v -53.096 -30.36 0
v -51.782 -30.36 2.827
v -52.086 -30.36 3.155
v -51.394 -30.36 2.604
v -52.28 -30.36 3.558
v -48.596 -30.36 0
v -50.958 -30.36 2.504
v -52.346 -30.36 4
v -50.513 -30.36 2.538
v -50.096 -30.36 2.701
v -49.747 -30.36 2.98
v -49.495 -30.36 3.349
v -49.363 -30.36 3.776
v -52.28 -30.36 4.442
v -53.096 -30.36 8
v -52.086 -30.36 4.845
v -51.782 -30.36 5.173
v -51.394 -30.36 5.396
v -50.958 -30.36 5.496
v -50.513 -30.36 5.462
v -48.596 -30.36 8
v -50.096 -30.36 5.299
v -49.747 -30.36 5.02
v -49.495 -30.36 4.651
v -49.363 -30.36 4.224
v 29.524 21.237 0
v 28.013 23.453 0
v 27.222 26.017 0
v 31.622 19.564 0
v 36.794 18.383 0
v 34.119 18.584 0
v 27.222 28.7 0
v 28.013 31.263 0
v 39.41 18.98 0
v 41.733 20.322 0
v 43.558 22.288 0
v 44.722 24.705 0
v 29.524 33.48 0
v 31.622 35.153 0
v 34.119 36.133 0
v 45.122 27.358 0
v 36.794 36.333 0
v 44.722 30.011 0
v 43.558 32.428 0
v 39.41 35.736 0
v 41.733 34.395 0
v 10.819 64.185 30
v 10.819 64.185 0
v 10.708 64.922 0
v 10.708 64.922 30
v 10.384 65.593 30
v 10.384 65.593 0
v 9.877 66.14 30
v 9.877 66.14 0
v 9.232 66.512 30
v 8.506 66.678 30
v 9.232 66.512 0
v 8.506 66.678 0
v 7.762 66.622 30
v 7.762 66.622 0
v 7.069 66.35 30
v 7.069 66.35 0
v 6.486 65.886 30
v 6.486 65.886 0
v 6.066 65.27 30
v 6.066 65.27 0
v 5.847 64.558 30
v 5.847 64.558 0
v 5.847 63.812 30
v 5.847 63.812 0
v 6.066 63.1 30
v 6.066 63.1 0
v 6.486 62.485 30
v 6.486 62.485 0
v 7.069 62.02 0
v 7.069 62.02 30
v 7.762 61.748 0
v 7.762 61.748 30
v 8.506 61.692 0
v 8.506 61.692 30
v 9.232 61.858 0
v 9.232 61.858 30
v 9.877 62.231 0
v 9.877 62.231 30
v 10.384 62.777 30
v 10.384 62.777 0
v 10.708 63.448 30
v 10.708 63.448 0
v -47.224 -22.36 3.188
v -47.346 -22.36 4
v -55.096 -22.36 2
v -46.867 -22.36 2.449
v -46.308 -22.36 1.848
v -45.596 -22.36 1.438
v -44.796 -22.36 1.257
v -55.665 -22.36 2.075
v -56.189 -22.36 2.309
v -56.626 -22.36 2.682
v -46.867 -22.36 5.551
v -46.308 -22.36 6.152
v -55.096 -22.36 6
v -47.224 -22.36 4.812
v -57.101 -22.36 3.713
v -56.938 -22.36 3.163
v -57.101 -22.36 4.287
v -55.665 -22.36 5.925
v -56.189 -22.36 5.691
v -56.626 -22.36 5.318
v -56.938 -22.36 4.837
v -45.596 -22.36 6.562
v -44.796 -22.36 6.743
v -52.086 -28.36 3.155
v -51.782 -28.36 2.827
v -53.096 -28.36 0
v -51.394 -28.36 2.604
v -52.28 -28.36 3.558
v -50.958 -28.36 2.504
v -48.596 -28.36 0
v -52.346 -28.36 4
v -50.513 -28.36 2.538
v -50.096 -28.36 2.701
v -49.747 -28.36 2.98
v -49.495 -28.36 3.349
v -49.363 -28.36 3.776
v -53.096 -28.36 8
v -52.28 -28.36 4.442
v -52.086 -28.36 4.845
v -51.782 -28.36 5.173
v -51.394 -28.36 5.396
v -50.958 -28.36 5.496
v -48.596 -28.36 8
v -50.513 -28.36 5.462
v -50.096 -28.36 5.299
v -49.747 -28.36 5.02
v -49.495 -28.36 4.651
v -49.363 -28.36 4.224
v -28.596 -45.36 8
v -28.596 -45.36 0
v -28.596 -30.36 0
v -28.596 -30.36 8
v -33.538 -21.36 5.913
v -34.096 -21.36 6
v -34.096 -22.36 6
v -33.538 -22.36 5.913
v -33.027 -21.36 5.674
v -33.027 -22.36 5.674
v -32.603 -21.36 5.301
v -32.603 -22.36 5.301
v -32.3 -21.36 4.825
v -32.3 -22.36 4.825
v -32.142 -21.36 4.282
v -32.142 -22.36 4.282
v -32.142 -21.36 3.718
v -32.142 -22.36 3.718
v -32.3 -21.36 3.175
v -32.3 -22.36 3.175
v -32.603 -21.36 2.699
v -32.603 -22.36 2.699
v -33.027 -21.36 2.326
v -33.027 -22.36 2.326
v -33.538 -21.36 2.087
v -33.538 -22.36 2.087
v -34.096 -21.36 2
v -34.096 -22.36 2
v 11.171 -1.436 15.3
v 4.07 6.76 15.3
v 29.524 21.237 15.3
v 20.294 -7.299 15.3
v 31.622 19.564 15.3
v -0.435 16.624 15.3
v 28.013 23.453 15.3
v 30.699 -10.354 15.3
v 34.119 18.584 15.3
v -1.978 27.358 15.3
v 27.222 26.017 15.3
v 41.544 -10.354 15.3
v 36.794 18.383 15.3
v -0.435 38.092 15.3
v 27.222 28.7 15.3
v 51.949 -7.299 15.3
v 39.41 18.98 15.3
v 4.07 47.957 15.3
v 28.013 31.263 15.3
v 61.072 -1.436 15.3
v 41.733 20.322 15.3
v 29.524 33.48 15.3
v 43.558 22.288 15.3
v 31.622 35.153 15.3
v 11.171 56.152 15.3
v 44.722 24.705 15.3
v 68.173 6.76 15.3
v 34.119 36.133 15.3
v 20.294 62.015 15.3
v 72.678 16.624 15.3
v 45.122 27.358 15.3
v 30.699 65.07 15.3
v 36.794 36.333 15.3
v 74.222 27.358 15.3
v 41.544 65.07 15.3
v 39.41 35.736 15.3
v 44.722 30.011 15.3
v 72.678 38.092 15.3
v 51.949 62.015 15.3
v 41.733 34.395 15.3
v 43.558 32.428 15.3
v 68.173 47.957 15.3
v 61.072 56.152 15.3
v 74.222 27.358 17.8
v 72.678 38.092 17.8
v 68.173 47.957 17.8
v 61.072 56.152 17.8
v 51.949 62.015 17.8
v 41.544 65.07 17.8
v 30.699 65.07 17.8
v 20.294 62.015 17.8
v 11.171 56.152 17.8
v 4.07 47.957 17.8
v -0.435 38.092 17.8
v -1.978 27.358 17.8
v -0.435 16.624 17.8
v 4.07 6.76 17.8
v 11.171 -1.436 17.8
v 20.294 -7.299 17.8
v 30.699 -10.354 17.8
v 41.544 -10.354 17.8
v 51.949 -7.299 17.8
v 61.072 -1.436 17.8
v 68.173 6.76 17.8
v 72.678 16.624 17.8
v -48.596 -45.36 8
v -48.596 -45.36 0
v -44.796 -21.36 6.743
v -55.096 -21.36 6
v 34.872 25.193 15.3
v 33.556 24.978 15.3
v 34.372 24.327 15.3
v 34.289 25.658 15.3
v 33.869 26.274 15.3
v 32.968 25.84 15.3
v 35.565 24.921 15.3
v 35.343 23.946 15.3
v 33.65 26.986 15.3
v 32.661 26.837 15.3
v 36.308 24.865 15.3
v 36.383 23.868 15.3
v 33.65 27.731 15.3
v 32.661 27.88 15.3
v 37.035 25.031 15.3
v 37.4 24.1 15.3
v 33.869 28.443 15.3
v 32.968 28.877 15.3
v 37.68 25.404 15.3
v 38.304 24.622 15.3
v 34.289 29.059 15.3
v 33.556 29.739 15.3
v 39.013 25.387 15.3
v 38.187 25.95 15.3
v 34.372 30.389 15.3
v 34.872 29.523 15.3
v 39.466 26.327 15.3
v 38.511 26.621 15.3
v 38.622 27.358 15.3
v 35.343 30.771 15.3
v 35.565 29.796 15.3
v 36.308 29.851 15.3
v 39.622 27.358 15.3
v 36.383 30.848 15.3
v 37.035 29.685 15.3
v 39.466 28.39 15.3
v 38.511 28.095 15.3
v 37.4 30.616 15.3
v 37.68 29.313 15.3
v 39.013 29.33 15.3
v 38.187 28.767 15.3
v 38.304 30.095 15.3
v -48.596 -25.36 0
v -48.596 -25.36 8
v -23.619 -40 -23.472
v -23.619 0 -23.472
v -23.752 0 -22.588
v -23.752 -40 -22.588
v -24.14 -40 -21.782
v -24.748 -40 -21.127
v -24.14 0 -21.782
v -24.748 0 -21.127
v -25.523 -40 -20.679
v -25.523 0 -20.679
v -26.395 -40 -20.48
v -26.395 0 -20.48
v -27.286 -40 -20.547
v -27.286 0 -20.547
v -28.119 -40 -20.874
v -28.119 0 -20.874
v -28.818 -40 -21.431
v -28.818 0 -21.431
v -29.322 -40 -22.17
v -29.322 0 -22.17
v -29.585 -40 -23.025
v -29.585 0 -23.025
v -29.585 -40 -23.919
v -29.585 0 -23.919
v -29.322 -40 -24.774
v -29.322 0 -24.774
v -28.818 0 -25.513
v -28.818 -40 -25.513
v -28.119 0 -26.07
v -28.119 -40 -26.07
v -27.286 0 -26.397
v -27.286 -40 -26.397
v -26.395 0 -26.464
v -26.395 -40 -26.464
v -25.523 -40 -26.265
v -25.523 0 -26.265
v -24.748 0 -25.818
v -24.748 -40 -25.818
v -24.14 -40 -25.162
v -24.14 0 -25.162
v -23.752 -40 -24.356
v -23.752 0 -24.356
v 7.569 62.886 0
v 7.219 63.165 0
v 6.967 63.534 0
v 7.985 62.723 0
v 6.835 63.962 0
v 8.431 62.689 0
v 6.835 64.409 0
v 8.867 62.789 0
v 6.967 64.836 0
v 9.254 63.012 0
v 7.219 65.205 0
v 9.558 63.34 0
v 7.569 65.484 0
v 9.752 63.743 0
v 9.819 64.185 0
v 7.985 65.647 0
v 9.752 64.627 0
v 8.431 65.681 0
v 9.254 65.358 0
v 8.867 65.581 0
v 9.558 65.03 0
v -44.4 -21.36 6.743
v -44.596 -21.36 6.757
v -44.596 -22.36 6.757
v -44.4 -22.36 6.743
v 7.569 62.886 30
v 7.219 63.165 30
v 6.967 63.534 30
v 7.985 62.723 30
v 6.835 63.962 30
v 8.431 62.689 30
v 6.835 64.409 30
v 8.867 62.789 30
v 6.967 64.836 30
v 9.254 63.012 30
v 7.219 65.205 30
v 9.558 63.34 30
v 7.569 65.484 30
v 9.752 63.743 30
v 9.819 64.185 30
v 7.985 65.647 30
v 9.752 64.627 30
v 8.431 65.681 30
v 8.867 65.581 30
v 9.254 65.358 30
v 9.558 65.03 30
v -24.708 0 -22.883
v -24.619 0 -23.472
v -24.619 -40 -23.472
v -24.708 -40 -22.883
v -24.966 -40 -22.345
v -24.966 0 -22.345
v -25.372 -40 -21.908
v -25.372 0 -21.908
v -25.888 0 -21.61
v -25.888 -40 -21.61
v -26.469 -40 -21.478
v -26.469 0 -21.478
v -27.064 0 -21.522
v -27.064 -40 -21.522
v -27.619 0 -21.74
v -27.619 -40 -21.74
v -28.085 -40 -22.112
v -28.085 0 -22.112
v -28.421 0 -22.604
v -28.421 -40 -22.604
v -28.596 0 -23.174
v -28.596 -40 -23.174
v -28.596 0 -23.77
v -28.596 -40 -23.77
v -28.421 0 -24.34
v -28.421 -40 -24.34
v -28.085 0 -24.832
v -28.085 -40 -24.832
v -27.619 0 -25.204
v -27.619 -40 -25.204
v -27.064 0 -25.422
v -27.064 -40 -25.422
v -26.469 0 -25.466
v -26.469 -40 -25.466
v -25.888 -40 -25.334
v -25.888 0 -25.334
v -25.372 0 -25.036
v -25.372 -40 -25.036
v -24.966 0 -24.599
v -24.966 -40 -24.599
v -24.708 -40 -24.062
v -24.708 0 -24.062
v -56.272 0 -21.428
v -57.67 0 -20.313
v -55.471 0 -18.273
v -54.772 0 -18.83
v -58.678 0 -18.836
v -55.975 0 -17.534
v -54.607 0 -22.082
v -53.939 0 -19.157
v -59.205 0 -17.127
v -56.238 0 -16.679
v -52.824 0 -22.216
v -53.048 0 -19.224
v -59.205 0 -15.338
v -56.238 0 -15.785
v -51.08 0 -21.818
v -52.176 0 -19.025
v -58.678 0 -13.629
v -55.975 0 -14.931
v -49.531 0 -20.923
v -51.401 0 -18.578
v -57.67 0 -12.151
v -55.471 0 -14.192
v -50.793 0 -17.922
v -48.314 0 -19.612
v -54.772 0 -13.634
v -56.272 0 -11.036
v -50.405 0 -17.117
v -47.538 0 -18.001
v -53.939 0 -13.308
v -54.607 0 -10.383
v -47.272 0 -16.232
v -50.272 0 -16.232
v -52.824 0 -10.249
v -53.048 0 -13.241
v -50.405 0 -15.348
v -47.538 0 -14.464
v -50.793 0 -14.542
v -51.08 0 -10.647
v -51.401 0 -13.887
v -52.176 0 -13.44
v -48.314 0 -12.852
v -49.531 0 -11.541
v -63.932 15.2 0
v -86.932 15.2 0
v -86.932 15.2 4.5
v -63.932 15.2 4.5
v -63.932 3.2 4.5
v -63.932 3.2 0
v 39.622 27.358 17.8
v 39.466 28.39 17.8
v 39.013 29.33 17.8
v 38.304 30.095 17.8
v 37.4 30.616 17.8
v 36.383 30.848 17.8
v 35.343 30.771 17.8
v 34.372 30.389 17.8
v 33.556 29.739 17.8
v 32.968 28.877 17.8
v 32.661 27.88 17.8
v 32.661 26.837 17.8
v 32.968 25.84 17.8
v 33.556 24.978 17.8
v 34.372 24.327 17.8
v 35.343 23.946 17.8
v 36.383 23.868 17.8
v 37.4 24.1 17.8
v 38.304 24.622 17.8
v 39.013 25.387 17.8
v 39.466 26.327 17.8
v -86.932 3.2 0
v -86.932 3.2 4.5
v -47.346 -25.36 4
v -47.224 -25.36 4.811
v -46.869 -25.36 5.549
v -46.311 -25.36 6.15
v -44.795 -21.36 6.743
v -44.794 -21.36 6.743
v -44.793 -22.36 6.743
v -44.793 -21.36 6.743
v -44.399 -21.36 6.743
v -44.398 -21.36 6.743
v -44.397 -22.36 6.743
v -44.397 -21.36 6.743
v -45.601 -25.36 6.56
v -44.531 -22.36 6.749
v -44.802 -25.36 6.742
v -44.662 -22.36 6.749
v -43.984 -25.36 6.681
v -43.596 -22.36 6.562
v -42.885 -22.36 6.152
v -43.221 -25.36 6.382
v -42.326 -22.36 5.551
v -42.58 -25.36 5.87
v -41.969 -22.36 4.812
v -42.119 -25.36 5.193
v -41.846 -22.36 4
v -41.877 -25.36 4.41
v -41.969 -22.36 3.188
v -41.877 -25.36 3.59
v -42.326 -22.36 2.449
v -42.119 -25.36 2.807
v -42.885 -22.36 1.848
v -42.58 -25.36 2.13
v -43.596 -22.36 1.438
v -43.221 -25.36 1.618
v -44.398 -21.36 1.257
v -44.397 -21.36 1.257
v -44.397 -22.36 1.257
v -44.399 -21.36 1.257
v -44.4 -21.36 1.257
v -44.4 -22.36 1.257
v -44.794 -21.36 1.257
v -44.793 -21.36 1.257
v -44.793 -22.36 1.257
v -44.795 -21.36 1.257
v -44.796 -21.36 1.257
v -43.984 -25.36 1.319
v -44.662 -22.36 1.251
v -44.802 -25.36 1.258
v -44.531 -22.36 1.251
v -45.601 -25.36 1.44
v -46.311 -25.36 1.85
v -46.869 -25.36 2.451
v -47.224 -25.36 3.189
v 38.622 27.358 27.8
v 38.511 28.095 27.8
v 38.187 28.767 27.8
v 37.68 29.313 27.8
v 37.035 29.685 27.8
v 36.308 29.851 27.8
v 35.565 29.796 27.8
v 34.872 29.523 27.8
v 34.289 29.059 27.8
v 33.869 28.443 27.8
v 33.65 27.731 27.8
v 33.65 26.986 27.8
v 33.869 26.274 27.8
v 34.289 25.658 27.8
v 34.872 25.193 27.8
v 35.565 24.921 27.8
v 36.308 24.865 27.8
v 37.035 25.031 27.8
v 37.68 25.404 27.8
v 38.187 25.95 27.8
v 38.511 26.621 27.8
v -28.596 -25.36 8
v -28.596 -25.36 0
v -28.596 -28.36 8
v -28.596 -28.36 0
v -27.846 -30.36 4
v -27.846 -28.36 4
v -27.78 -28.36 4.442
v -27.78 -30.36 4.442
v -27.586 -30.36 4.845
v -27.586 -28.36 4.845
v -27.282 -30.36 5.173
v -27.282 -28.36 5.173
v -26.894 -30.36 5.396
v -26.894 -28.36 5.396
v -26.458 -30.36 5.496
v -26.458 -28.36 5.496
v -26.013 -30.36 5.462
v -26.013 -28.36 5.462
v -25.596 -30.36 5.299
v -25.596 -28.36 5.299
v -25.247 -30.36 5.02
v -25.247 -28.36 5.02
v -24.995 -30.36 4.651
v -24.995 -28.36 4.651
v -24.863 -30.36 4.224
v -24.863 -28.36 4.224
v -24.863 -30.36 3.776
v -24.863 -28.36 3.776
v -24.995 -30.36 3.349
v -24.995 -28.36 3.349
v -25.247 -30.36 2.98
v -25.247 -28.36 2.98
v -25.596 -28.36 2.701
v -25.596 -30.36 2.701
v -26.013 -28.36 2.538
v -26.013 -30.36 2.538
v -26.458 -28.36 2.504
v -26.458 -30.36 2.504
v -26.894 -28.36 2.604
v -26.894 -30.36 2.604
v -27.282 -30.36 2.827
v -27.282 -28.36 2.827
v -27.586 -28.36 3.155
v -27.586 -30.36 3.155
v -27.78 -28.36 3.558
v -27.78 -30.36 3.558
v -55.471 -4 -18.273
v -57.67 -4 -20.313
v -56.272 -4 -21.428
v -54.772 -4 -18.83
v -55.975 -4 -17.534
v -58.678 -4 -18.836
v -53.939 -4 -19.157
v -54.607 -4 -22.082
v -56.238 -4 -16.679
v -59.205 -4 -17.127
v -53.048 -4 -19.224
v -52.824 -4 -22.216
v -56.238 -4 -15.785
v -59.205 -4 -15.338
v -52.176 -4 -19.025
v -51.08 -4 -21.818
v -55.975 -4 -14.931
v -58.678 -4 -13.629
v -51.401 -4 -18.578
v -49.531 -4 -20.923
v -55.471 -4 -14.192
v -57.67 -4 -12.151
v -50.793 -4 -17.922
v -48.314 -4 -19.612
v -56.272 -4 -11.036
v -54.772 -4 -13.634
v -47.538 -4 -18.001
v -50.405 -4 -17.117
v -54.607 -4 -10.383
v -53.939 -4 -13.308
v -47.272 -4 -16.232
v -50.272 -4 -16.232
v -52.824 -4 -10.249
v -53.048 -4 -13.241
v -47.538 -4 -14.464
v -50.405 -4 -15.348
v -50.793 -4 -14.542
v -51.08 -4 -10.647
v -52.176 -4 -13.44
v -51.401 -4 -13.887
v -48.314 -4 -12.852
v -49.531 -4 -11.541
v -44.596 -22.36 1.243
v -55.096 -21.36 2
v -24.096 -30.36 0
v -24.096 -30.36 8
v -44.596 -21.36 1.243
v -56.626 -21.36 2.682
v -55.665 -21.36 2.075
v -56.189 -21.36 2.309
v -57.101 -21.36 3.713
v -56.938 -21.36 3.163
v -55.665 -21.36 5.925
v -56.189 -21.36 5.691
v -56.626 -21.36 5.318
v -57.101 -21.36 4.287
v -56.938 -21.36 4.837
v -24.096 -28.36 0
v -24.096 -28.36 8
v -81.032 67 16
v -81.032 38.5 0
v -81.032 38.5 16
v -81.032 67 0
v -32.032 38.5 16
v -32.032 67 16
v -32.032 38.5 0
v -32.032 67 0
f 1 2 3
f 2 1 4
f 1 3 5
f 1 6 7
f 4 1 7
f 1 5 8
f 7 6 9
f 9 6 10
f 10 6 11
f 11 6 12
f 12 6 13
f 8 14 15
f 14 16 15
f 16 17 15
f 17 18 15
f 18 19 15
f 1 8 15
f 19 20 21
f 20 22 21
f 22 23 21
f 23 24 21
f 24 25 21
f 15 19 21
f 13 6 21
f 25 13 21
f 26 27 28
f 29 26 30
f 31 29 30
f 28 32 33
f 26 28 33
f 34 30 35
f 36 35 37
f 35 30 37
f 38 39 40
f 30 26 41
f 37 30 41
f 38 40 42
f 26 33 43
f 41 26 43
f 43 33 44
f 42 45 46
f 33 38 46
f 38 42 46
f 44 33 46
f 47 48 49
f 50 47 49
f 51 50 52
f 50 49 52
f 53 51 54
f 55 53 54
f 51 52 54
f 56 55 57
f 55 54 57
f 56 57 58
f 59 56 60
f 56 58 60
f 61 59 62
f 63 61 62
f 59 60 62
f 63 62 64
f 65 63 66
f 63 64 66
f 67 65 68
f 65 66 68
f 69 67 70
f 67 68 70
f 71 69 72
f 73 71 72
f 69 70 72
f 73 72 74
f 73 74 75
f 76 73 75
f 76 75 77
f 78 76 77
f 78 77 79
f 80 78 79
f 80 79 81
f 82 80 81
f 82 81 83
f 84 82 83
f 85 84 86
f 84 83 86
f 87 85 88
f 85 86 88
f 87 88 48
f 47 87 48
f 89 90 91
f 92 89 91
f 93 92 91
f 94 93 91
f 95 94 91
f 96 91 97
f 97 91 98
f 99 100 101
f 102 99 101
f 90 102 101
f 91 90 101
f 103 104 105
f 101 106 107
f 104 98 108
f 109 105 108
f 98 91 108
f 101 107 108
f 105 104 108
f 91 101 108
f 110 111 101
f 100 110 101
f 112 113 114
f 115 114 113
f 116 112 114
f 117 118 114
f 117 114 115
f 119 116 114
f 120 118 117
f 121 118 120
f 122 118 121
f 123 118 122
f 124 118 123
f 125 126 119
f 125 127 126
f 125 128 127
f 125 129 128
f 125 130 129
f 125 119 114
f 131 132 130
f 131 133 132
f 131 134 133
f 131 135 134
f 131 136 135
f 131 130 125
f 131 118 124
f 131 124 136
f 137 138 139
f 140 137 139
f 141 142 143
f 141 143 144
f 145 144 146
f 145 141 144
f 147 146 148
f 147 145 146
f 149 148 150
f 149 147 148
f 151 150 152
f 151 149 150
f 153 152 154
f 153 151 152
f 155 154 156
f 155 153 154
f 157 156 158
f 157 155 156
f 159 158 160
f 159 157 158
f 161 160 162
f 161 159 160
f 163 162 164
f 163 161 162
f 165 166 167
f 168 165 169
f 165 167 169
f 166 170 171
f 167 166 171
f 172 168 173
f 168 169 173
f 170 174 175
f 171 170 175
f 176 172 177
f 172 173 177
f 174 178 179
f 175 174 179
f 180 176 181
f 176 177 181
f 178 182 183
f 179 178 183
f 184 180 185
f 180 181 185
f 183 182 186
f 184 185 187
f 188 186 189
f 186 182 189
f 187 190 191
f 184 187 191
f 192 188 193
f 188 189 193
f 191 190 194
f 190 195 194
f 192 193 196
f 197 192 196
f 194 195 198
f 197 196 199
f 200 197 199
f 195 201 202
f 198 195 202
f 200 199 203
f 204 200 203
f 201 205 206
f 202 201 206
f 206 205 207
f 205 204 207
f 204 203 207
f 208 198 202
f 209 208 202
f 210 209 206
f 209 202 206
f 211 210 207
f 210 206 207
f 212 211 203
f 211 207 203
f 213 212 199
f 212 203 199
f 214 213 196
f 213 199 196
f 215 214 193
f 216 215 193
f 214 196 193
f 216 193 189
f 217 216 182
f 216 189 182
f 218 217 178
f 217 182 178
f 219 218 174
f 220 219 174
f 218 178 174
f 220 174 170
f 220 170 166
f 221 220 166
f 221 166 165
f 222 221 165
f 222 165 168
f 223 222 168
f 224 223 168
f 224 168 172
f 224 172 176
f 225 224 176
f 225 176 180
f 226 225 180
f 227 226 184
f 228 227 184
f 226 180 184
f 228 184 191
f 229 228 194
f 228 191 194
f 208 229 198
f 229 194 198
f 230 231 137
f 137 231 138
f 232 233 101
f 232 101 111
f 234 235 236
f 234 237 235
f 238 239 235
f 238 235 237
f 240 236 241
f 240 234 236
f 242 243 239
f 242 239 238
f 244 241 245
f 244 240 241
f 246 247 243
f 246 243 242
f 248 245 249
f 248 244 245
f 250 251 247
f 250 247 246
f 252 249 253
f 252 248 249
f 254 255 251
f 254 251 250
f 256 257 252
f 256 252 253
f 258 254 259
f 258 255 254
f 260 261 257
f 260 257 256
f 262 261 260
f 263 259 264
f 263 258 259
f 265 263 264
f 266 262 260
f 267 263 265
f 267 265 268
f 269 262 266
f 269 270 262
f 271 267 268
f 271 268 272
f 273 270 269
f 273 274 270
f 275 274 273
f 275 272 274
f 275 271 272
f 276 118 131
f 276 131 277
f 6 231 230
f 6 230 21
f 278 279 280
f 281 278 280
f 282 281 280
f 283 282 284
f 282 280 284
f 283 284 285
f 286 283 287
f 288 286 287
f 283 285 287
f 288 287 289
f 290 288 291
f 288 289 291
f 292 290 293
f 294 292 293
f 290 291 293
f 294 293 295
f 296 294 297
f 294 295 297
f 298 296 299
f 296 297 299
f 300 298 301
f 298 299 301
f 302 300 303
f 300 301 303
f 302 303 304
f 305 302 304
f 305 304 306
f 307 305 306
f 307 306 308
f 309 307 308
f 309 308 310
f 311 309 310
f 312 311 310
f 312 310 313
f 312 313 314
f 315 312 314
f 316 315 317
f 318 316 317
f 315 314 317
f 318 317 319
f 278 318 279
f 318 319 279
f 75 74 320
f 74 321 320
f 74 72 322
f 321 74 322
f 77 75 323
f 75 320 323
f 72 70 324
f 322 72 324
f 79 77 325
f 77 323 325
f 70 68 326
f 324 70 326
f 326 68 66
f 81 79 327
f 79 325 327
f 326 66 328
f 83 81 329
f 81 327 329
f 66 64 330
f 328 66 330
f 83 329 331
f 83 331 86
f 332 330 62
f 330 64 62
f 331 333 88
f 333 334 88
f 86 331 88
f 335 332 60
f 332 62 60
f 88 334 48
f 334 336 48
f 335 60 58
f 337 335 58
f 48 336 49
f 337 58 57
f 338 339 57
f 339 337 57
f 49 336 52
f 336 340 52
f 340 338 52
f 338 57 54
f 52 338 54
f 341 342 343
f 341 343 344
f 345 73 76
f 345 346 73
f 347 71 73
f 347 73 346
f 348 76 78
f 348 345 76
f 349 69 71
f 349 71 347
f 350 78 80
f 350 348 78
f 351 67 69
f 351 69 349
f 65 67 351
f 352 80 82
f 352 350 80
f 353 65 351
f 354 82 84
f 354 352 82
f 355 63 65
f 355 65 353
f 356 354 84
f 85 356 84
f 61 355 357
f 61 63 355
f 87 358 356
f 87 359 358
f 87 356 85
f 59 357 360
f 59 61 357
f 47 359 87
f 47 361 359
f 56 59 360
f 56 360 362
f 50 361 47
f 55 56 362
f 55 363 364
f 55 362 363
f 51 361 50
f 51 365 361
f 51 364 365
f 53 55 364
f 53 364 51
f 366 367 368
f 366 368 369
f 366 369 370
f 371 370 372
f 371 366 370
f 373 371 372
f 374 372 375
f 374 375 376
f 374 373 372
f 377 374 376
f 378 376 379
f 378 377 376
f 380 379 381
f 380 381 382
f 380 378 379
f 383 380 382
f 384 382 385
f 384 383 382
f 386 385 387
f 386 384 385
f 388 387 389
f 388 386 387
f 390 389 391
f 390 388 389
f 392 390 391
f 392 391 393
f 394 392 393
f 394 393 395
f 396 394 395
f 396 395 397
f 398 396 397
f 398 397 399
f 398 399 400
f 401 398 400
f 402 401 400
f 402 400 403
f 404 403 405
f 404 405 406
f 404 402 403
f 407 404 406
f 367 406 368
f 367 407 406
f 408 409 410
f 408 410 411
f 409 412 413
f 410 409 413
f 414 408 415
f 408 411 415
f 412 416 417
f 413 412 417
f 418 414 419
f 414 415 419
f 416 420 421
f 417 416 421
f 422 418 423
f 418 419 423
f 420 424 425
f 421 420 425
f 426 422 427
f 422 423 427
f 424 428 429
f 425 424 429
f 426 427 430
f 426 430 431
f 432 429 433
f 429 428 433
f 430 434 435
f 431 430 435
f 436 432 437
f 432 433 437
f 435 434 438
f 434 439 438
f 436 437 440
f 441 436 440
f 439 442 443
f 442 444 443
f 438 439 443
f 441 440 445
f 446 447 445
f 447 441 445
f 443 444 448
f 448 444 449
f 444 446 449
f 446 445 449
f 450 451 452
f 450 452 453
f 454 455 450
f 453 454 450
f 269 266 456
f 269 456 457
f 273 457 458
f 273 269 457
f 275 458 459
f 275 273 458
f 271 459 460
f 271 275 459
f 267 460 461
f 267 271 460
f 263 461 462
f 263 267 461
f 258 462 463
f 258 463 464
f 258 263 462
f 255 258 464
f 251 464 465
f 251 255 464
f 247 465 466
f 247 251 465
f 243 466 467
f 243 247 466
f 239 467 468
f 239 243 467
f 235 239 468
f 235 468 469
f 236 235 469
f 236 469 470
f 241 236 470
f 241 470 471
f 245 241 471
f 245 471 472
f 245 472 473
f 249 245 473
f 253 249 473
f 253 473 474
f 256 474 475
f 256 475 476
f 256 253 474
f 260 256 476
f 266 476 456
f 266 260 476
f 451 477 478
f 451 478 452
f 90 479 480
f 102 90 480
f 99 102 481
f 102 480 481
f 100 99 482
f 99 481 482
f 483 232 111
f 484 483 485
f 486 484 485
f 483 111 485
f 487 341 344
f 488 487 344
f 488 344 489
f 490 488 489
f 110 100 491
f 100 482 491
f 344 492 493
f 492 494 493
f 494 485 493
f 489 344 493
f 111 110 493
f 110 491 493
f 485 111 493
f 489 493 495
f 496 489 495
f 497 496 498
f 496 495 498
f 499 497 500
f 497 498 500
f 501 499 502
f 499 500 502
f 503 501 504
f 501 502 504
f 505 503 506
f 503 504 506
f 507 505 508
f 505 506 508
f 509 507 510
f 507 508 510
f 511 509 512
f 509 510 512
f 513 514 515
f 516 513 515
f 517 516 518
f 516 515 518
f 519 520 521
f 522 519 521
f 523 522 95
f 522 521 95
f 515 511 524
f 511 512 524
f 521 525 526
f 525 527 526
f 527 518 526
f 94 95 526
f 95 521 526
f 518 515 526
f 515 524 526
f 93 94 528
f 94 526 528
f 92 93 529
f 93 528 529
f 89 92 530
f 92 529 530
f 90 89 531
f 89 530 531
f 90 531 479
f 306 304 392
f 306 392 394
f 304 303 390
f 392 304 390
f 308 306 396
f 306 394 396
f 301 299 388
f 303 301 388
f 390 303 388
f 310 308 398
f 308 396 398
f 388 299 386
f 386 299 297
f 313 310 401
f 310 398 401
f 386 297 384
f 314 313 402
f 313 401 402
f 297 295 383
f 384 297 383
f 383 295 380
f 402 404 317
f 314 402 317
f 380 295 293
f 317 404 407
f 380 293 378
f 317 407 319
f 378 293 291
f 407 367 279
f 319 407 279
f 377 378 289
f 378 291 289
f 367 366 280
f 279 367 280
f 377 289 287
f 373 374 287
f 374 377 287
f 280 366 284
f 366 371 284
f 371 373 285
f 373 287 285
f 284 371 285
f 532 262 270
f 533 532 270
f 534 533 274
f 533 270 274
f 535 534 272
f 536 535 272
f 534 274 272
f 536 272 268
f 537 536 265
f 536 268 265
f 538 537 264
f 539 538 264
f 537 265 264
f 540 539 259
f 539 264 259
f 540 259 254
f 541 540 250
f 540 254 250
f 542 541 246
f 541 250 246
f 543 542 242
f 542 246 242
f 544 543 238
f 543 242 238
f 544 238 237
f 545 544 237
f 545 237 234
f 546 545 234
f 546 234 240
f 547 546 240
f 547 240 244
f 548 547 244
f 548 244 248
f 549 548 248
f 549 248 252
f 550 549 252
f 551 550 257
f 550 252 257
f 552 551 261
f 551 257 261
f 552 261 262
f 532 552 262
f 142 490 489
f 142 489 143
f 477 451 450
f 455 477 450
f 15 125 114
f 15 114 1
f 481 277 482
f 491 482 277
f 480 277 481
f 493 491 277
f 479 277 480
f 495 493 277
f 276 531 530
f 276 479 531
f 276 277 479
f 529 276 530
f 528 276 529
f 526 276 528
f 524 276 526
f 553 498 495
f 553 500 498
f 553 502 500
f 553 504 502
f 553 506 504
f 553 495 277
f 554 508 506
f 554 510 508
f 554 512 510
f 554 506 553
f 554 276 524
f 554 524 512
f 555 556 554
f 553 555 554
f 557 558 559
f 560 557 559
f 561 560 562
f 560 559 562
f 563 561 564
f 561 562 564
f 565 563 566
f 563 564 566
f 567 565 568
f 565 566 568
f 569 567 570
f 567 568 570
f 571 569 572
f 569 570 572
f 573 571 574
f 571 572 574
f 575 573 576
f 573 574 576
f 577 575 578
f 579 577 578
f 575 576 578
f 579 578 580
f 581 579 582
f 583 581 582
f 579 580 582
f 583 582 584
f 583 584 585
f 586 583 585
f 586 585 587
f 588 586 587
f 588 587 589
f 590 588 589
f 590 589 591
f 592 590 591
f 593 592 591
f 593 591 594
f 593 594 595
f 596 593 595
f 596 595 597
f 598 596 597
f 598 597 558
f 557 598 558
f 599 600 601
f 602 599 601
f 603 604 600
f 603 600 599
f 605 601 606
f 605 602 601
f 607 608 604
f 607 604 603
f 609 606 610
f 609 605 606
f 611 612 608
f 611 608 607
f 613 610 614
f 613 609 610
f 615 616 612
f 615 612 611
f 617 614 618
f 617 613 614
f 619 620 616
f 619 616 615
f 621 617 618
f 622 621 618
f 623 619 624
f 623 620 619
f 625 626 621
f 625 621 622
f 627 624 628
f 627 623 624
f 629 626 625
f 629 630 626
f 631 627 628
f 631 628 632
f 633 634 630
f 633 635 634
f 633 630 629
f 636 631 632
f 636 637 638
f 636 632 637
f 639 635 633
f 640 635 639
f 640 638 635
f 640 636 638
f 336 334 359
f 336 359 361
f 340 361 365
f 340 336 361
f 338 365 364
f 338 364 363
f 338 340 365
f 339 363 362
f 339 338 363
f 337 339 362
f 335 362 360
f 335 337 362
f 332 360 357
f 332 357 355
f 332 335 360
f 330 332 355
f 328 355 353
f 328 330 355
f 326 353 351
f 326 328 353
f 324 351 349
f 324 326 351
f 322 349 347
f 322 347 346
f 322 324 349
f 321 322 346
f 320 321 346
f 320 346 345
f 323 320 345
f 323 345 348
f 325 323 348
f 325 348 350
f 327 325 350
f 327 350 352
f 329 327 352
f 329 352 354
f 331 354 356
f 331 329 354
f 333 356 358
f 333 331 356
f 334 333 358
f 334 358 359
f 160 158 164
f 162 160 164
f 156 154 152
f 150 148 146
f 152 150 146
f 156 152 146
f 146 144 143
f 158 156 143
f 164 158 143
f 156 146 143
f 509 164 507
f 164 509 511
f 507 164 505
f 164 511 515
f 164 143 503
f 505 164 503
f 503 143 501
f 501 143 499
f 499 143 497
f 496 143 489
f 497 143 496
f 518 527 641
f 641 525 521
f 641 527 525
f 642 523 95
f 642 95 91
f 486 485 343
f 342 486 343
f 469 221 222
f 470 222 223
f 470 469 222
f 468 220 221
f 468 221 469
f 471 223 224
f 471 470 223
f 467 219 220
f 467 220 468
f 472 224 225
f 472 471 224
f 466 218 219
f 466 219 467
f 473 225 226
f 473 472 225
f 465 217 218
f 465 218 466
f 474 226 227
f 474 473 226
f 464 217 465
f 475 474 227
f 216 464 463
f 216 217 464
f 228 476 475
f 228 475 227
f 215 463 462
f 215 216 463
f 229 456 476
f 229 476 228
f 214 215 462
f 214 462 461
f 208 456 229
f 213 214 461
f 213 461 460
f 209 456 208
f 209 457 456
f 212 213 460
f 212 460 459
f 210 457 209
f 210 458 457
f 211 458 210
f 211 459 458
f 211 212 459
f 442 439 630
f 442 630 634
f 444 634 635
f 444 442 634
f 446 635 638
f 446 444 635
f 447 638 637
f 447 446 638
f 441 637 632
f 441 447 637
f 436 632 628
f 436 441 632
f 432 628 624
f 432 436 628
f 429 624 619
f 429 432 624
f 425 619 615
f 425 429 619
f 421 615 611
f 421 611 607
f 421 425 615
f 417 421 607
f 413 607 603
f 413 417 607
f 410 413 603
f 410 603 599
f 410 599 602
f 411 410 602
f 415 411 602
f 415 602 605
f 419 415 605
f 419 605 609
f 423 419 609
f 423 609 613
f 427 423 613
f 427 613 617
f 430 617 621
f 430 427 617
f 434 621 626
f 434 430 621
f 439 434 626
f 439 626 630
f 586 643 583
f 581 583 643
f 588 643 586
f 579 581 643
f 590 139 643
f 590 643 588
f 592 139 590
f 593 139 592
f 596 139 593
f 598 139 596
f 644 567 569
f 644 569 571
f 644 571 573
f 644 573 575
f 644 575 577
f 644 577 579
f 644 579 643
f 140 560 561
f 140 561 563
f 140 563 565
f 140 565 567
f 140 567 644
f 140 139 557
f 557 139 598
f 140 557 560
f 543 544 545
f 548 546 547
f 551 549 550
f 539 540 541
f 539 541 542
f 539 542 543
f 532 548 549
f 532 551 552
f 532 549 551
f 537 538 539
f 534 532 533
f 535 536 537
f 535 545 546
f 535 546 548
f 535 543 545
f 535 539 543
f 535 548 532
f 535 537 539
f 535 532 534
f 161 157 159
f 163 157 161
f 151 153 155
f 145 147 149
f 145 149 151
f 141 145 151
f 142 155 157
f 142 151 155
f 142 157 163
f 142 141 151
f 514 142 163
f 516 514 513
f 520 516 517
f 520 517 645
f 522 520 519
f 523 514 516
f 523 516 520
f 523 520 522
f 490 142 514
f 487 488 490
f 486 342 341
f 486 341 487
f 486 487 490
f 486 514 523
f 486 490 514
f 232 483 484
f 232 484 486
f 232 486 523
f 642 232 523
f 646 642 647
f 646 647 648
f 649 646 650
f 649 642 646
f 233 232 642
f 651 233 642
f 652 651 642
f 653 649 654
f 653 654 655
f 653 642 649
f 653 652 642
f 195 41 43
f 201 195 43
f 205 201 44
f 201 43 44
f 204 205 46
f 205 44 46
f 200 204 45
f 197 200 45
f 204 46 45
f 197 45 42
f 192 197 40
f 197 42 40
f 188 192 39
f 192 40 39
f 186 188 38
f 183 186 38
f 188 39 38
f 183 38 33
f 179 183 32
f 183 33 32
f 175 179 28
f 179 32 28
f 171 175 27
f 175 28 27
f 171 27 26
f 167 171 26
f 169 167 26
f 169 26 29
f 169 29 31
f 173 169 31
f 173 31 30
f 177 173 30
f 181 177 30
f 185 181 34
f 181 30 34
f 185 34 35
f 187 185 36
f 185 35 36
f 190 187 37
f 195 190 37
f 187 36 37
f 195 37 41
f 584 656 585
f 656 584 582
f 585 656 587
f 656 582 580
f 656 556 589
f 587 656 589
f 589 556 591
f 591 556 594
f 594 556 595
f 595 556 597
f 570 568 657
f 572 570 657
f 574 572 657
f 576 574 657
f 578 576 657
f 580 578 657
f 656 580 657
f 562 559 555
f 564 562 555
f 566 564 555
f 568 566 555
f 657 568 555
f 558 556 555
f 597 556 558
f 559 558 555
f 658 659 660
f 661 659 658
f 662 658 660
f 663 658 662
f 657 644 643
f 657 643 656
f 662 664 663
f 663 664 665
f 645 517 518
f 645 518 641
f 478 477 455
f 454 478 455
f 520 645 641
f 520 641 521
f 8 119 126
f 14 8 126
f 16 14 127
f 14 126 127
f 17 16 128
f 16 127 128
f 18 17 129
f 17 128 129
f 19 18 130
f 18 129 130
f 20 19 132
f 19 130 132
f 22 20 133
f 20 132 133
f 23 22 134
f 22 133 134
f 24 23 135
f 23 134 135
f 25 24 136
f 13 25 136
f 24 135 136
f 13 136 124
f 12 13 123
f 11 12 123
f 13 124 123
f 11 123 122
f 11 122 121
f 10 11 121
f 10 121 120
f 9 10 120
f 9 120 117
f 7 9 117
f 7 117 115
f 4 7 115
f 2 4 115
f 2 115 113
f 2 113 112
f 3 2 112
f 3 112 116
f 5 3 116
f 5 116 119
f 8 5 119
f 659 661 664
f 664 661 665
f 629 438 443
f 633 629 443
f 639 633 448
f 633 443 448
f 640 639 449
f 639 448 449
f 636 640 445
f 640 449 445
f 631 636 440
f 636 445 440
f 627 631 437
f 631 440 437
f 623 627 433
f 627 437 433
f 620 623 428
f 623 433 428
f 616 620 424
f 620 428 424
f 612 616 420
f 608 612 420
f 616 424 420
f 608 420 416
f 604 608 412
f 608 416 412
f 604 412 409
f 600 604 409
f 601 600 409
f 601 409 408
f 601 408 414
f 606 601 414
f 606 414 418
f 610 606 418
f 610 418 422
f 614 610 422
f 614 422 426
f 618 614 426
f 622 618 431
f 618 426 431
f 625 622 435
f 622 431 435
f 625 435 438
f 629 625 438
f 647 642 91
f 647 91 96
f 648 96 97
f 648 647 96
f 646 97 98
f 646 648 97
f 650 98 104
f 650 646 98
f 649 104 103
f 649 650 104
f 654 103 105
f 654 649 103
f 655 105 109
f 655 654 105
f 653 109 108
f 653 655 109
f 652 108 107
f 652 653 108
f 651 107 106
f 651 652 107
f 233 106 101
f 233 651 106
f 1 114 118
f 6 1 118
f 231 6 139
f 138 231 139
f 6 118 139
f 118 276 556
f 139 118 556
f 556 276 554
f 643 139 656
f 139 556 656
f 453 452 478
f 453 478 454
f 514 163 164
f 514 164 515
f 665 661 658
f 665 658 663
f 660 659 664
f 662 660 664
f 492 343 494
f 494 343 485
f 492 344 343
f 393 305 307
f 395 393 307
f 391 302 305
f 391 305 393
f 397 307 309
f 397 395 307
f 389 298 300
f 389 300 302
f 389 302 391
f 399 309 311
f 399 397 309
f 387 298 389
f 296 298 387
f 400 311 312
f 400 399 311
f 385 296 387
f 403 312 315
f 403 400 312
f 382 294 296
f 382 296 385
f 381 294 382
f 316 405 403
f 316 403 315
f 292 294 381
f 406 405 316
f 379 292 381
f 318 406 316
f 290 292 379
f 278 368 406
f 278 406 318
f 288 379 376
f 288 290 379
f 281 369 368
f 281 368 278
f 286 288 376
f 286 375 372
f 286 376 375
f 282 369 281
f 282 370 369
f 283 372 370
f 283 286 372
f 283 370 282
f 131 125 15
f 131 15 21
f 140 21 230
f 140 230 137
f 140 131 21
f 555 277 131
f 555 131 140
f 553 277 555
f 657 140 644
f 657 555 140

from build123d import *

# Parameters (mm, degrees)
F0_R      = 2.5
F0_R_2    = 1.5
F1_DEPTH  = 30
F2_R      = 9
F3_DEPTH  = 15.3
F4_R      = 2.5
F5_DEPTH  = 12.5
F6_R      = 38.1
F6_R_2    = 3.5
F7_DEPTH  = 2.5
F8_W      = 20
F8_H      = 20
F9_DEPTH  = 8
F10_W     = 2
F10_H     = 8
F11_DEPTH = 4.5
F12_W     = 2
F12_H     = 8
F13_DEPTH = 4.5
F14_R     = 2.75
F15_DEPTH = 4
F16_R     = 1.5
F17_DEPTH = 17.001
F18_W     = 49
F18_H     = 28.5
F19_DEPTH = 16
F21_DEPTH = 1
F22_W     = 23
F22_H     = 12
F23_DEPTH = 4.5
F24_R     = 6
F24_R_2   = 3
F25_DEPTH = 4
F26_R     = 3
F26_R_2   = 2
F27_DEPTH = 40


with BuildPart() as f1:
    # F0 (on Top) → F1 (new body)
    with BuildSketch(Plane.XY):
        with Locations((8.318727, 64.185089)):
            Circle(F0_R)
        with Locations((8.318727, 64.185089)):
            Circle(F0_R_2, mode=Mode.SUBTRACT)
    extrude(amount=F1_DEPTH)


with BuildPart() as f3:
    # F2 (on Top) → F3 (new body)
    with BuildSketch(Plane.XY):
        with Locations((36.121637, 27.358277)):
            Circle(F2_R)
    extrude(amount=F3_DEPTH)

    # F4 (on face) → F5 (join)
    with BuildSketch(Plane.XY.offset(15.3)):
        with Locations((36.121637, 27.358277)):
            Circle(F4_R)
    extrude(amount=F5_DEPTH)

    # F6 (on face) → F7 (join)
    with BuildSketch(Plane.XY.offset(15.3)):
        with Locations((36.121637, 27.358277)):
            Circle(F6_R)
        with Locations((36.121637, 27.358277)):
            Circle(F6_R_2, mode=Mode.SUBTRACT)
    extrude(amount=F7_DEPTH)


with BuildPart() as f9:
    # F8 (on Top) → F9 (new body)
    with BuildSketch(Plane.XY):
        with Locations((-38.596382, -35.360286)):
            Rectangle(F8_W, F8_H)
    extrude(amount=F9_DEPTH)

    # F10 (on face) → F11 (join)
    with BuildSketch(Plane.YZ.offset(-28.596382)):
        with Locations((-29.360286, 4)):
            Rectangle(F10_W, F10_H)
    extrude(amount=F11_DEPTH)

    # F12 (on face) → F13 (join)
    with BuildSketch(Plane(origin=(-48.596382, 0, 0), x_dir=(0, -1, 0), z_dir=(-1, 0, 0))):
        with Locations((29.360286, 4)):
            Rectangle(F12_W, F12_H)
    extrude(amount=F13_DEPTH)

    # F14 (on face) → F15 (join)
    with BuildSketch(Plane(origin=(0, -25.360286, 0), x_dir=(-1, 0, 0), z_dir=(0, 1, 0))):
        with Locations((44.596382, 4)):
            Circle(F14_R)
    extrude(amount=F15_DEPTH)

    # F16 (on face) → F17 (cut, through all)
    with BuildSketch(Plane(origin=(0, -28.360286, 0), x_dir=(-1, 0, 0), z_dir=(0, 1, 0))):
        with Locations((50.846382, 4)):
            Circle(F16_R)
        with Locations((26.346382, 4)):
            Circle(F16_R)
    extrude(amount=-F17_DEPTH, mode=Mode.SUBTRACT)

    # F20 (on face) → F21 (join)
    with BuildSketch(Plane(origin=(0, -21.360286, 0), x_dir=(-1, 0, 0), z_dir=(0, 1, 0))):
        with BuildLine():
            Line((55.096382, 5.999839), (44.596382, 6.757143))
            Line((44.596382, 6.757143), (34.096382, 5.999839))
            ThreePointArc((34.096382, 5.999839), (32.121733, 4), (34.096382, 2.000161))
            Line((34.096382, 2.000161), (44.596382, 1.242857))
            Line((44.596382, 1.242857), (55.096382, 2.000161))
            ThreePointArc((55.096382, 2.000161), (57.121733, 4), (55.096382, 5.999839))
        make_face()
    extrude(amount=-F21_DEPTH)


with BuildPart() as f19:
    # F18 (on Top) → F19 (new body)
    with BuildSketch(Plane.XY):
        with Locations((-56.532371, 52.750417)):
            Rectangle(F18_W, F18_H)
    extrude(amount=F19_DEPTH)


with BuildPart() as f23:
    # F22 (on Top) → F23 (new body)
    with BuildSketch(Plane.XY):
        with Locations((-75.432478, 9.199938)):
            Rectangle(F22_W, F22_H)
    extrude(amount=F23_DEPTH)


with BuildPart() as f25:
    # F24 (on Front) → F25 (new body)
    with BuildSketch(Plane.XZ):
        with Locations((-53.271893, -16.232332)):
            Circle(F24_R)
        with Locations((-53.271893, -16.232332)):
            Circle(F24_R_2, mode=Mode.SUBTRACT)
    extrude(amount=F25_DEPTH)


with BuildPart() as f27:
    # F26 (on Front) → F27 (new body)
    with BuildSketch(Plane.XZ):
        with Locations((-26.618712, -23.472017)):
            Circle(F26_R)
        with Locations((-26.618712, -23.472017)):
            Circle(F26_R_2, mode=Mode.SUBTRACT)
    extrude(amount=F27_DEPTH)


solid = Compound([f1.part, f3.part, f9.part, f19.part, f23.part, f25.part, f27.part])
